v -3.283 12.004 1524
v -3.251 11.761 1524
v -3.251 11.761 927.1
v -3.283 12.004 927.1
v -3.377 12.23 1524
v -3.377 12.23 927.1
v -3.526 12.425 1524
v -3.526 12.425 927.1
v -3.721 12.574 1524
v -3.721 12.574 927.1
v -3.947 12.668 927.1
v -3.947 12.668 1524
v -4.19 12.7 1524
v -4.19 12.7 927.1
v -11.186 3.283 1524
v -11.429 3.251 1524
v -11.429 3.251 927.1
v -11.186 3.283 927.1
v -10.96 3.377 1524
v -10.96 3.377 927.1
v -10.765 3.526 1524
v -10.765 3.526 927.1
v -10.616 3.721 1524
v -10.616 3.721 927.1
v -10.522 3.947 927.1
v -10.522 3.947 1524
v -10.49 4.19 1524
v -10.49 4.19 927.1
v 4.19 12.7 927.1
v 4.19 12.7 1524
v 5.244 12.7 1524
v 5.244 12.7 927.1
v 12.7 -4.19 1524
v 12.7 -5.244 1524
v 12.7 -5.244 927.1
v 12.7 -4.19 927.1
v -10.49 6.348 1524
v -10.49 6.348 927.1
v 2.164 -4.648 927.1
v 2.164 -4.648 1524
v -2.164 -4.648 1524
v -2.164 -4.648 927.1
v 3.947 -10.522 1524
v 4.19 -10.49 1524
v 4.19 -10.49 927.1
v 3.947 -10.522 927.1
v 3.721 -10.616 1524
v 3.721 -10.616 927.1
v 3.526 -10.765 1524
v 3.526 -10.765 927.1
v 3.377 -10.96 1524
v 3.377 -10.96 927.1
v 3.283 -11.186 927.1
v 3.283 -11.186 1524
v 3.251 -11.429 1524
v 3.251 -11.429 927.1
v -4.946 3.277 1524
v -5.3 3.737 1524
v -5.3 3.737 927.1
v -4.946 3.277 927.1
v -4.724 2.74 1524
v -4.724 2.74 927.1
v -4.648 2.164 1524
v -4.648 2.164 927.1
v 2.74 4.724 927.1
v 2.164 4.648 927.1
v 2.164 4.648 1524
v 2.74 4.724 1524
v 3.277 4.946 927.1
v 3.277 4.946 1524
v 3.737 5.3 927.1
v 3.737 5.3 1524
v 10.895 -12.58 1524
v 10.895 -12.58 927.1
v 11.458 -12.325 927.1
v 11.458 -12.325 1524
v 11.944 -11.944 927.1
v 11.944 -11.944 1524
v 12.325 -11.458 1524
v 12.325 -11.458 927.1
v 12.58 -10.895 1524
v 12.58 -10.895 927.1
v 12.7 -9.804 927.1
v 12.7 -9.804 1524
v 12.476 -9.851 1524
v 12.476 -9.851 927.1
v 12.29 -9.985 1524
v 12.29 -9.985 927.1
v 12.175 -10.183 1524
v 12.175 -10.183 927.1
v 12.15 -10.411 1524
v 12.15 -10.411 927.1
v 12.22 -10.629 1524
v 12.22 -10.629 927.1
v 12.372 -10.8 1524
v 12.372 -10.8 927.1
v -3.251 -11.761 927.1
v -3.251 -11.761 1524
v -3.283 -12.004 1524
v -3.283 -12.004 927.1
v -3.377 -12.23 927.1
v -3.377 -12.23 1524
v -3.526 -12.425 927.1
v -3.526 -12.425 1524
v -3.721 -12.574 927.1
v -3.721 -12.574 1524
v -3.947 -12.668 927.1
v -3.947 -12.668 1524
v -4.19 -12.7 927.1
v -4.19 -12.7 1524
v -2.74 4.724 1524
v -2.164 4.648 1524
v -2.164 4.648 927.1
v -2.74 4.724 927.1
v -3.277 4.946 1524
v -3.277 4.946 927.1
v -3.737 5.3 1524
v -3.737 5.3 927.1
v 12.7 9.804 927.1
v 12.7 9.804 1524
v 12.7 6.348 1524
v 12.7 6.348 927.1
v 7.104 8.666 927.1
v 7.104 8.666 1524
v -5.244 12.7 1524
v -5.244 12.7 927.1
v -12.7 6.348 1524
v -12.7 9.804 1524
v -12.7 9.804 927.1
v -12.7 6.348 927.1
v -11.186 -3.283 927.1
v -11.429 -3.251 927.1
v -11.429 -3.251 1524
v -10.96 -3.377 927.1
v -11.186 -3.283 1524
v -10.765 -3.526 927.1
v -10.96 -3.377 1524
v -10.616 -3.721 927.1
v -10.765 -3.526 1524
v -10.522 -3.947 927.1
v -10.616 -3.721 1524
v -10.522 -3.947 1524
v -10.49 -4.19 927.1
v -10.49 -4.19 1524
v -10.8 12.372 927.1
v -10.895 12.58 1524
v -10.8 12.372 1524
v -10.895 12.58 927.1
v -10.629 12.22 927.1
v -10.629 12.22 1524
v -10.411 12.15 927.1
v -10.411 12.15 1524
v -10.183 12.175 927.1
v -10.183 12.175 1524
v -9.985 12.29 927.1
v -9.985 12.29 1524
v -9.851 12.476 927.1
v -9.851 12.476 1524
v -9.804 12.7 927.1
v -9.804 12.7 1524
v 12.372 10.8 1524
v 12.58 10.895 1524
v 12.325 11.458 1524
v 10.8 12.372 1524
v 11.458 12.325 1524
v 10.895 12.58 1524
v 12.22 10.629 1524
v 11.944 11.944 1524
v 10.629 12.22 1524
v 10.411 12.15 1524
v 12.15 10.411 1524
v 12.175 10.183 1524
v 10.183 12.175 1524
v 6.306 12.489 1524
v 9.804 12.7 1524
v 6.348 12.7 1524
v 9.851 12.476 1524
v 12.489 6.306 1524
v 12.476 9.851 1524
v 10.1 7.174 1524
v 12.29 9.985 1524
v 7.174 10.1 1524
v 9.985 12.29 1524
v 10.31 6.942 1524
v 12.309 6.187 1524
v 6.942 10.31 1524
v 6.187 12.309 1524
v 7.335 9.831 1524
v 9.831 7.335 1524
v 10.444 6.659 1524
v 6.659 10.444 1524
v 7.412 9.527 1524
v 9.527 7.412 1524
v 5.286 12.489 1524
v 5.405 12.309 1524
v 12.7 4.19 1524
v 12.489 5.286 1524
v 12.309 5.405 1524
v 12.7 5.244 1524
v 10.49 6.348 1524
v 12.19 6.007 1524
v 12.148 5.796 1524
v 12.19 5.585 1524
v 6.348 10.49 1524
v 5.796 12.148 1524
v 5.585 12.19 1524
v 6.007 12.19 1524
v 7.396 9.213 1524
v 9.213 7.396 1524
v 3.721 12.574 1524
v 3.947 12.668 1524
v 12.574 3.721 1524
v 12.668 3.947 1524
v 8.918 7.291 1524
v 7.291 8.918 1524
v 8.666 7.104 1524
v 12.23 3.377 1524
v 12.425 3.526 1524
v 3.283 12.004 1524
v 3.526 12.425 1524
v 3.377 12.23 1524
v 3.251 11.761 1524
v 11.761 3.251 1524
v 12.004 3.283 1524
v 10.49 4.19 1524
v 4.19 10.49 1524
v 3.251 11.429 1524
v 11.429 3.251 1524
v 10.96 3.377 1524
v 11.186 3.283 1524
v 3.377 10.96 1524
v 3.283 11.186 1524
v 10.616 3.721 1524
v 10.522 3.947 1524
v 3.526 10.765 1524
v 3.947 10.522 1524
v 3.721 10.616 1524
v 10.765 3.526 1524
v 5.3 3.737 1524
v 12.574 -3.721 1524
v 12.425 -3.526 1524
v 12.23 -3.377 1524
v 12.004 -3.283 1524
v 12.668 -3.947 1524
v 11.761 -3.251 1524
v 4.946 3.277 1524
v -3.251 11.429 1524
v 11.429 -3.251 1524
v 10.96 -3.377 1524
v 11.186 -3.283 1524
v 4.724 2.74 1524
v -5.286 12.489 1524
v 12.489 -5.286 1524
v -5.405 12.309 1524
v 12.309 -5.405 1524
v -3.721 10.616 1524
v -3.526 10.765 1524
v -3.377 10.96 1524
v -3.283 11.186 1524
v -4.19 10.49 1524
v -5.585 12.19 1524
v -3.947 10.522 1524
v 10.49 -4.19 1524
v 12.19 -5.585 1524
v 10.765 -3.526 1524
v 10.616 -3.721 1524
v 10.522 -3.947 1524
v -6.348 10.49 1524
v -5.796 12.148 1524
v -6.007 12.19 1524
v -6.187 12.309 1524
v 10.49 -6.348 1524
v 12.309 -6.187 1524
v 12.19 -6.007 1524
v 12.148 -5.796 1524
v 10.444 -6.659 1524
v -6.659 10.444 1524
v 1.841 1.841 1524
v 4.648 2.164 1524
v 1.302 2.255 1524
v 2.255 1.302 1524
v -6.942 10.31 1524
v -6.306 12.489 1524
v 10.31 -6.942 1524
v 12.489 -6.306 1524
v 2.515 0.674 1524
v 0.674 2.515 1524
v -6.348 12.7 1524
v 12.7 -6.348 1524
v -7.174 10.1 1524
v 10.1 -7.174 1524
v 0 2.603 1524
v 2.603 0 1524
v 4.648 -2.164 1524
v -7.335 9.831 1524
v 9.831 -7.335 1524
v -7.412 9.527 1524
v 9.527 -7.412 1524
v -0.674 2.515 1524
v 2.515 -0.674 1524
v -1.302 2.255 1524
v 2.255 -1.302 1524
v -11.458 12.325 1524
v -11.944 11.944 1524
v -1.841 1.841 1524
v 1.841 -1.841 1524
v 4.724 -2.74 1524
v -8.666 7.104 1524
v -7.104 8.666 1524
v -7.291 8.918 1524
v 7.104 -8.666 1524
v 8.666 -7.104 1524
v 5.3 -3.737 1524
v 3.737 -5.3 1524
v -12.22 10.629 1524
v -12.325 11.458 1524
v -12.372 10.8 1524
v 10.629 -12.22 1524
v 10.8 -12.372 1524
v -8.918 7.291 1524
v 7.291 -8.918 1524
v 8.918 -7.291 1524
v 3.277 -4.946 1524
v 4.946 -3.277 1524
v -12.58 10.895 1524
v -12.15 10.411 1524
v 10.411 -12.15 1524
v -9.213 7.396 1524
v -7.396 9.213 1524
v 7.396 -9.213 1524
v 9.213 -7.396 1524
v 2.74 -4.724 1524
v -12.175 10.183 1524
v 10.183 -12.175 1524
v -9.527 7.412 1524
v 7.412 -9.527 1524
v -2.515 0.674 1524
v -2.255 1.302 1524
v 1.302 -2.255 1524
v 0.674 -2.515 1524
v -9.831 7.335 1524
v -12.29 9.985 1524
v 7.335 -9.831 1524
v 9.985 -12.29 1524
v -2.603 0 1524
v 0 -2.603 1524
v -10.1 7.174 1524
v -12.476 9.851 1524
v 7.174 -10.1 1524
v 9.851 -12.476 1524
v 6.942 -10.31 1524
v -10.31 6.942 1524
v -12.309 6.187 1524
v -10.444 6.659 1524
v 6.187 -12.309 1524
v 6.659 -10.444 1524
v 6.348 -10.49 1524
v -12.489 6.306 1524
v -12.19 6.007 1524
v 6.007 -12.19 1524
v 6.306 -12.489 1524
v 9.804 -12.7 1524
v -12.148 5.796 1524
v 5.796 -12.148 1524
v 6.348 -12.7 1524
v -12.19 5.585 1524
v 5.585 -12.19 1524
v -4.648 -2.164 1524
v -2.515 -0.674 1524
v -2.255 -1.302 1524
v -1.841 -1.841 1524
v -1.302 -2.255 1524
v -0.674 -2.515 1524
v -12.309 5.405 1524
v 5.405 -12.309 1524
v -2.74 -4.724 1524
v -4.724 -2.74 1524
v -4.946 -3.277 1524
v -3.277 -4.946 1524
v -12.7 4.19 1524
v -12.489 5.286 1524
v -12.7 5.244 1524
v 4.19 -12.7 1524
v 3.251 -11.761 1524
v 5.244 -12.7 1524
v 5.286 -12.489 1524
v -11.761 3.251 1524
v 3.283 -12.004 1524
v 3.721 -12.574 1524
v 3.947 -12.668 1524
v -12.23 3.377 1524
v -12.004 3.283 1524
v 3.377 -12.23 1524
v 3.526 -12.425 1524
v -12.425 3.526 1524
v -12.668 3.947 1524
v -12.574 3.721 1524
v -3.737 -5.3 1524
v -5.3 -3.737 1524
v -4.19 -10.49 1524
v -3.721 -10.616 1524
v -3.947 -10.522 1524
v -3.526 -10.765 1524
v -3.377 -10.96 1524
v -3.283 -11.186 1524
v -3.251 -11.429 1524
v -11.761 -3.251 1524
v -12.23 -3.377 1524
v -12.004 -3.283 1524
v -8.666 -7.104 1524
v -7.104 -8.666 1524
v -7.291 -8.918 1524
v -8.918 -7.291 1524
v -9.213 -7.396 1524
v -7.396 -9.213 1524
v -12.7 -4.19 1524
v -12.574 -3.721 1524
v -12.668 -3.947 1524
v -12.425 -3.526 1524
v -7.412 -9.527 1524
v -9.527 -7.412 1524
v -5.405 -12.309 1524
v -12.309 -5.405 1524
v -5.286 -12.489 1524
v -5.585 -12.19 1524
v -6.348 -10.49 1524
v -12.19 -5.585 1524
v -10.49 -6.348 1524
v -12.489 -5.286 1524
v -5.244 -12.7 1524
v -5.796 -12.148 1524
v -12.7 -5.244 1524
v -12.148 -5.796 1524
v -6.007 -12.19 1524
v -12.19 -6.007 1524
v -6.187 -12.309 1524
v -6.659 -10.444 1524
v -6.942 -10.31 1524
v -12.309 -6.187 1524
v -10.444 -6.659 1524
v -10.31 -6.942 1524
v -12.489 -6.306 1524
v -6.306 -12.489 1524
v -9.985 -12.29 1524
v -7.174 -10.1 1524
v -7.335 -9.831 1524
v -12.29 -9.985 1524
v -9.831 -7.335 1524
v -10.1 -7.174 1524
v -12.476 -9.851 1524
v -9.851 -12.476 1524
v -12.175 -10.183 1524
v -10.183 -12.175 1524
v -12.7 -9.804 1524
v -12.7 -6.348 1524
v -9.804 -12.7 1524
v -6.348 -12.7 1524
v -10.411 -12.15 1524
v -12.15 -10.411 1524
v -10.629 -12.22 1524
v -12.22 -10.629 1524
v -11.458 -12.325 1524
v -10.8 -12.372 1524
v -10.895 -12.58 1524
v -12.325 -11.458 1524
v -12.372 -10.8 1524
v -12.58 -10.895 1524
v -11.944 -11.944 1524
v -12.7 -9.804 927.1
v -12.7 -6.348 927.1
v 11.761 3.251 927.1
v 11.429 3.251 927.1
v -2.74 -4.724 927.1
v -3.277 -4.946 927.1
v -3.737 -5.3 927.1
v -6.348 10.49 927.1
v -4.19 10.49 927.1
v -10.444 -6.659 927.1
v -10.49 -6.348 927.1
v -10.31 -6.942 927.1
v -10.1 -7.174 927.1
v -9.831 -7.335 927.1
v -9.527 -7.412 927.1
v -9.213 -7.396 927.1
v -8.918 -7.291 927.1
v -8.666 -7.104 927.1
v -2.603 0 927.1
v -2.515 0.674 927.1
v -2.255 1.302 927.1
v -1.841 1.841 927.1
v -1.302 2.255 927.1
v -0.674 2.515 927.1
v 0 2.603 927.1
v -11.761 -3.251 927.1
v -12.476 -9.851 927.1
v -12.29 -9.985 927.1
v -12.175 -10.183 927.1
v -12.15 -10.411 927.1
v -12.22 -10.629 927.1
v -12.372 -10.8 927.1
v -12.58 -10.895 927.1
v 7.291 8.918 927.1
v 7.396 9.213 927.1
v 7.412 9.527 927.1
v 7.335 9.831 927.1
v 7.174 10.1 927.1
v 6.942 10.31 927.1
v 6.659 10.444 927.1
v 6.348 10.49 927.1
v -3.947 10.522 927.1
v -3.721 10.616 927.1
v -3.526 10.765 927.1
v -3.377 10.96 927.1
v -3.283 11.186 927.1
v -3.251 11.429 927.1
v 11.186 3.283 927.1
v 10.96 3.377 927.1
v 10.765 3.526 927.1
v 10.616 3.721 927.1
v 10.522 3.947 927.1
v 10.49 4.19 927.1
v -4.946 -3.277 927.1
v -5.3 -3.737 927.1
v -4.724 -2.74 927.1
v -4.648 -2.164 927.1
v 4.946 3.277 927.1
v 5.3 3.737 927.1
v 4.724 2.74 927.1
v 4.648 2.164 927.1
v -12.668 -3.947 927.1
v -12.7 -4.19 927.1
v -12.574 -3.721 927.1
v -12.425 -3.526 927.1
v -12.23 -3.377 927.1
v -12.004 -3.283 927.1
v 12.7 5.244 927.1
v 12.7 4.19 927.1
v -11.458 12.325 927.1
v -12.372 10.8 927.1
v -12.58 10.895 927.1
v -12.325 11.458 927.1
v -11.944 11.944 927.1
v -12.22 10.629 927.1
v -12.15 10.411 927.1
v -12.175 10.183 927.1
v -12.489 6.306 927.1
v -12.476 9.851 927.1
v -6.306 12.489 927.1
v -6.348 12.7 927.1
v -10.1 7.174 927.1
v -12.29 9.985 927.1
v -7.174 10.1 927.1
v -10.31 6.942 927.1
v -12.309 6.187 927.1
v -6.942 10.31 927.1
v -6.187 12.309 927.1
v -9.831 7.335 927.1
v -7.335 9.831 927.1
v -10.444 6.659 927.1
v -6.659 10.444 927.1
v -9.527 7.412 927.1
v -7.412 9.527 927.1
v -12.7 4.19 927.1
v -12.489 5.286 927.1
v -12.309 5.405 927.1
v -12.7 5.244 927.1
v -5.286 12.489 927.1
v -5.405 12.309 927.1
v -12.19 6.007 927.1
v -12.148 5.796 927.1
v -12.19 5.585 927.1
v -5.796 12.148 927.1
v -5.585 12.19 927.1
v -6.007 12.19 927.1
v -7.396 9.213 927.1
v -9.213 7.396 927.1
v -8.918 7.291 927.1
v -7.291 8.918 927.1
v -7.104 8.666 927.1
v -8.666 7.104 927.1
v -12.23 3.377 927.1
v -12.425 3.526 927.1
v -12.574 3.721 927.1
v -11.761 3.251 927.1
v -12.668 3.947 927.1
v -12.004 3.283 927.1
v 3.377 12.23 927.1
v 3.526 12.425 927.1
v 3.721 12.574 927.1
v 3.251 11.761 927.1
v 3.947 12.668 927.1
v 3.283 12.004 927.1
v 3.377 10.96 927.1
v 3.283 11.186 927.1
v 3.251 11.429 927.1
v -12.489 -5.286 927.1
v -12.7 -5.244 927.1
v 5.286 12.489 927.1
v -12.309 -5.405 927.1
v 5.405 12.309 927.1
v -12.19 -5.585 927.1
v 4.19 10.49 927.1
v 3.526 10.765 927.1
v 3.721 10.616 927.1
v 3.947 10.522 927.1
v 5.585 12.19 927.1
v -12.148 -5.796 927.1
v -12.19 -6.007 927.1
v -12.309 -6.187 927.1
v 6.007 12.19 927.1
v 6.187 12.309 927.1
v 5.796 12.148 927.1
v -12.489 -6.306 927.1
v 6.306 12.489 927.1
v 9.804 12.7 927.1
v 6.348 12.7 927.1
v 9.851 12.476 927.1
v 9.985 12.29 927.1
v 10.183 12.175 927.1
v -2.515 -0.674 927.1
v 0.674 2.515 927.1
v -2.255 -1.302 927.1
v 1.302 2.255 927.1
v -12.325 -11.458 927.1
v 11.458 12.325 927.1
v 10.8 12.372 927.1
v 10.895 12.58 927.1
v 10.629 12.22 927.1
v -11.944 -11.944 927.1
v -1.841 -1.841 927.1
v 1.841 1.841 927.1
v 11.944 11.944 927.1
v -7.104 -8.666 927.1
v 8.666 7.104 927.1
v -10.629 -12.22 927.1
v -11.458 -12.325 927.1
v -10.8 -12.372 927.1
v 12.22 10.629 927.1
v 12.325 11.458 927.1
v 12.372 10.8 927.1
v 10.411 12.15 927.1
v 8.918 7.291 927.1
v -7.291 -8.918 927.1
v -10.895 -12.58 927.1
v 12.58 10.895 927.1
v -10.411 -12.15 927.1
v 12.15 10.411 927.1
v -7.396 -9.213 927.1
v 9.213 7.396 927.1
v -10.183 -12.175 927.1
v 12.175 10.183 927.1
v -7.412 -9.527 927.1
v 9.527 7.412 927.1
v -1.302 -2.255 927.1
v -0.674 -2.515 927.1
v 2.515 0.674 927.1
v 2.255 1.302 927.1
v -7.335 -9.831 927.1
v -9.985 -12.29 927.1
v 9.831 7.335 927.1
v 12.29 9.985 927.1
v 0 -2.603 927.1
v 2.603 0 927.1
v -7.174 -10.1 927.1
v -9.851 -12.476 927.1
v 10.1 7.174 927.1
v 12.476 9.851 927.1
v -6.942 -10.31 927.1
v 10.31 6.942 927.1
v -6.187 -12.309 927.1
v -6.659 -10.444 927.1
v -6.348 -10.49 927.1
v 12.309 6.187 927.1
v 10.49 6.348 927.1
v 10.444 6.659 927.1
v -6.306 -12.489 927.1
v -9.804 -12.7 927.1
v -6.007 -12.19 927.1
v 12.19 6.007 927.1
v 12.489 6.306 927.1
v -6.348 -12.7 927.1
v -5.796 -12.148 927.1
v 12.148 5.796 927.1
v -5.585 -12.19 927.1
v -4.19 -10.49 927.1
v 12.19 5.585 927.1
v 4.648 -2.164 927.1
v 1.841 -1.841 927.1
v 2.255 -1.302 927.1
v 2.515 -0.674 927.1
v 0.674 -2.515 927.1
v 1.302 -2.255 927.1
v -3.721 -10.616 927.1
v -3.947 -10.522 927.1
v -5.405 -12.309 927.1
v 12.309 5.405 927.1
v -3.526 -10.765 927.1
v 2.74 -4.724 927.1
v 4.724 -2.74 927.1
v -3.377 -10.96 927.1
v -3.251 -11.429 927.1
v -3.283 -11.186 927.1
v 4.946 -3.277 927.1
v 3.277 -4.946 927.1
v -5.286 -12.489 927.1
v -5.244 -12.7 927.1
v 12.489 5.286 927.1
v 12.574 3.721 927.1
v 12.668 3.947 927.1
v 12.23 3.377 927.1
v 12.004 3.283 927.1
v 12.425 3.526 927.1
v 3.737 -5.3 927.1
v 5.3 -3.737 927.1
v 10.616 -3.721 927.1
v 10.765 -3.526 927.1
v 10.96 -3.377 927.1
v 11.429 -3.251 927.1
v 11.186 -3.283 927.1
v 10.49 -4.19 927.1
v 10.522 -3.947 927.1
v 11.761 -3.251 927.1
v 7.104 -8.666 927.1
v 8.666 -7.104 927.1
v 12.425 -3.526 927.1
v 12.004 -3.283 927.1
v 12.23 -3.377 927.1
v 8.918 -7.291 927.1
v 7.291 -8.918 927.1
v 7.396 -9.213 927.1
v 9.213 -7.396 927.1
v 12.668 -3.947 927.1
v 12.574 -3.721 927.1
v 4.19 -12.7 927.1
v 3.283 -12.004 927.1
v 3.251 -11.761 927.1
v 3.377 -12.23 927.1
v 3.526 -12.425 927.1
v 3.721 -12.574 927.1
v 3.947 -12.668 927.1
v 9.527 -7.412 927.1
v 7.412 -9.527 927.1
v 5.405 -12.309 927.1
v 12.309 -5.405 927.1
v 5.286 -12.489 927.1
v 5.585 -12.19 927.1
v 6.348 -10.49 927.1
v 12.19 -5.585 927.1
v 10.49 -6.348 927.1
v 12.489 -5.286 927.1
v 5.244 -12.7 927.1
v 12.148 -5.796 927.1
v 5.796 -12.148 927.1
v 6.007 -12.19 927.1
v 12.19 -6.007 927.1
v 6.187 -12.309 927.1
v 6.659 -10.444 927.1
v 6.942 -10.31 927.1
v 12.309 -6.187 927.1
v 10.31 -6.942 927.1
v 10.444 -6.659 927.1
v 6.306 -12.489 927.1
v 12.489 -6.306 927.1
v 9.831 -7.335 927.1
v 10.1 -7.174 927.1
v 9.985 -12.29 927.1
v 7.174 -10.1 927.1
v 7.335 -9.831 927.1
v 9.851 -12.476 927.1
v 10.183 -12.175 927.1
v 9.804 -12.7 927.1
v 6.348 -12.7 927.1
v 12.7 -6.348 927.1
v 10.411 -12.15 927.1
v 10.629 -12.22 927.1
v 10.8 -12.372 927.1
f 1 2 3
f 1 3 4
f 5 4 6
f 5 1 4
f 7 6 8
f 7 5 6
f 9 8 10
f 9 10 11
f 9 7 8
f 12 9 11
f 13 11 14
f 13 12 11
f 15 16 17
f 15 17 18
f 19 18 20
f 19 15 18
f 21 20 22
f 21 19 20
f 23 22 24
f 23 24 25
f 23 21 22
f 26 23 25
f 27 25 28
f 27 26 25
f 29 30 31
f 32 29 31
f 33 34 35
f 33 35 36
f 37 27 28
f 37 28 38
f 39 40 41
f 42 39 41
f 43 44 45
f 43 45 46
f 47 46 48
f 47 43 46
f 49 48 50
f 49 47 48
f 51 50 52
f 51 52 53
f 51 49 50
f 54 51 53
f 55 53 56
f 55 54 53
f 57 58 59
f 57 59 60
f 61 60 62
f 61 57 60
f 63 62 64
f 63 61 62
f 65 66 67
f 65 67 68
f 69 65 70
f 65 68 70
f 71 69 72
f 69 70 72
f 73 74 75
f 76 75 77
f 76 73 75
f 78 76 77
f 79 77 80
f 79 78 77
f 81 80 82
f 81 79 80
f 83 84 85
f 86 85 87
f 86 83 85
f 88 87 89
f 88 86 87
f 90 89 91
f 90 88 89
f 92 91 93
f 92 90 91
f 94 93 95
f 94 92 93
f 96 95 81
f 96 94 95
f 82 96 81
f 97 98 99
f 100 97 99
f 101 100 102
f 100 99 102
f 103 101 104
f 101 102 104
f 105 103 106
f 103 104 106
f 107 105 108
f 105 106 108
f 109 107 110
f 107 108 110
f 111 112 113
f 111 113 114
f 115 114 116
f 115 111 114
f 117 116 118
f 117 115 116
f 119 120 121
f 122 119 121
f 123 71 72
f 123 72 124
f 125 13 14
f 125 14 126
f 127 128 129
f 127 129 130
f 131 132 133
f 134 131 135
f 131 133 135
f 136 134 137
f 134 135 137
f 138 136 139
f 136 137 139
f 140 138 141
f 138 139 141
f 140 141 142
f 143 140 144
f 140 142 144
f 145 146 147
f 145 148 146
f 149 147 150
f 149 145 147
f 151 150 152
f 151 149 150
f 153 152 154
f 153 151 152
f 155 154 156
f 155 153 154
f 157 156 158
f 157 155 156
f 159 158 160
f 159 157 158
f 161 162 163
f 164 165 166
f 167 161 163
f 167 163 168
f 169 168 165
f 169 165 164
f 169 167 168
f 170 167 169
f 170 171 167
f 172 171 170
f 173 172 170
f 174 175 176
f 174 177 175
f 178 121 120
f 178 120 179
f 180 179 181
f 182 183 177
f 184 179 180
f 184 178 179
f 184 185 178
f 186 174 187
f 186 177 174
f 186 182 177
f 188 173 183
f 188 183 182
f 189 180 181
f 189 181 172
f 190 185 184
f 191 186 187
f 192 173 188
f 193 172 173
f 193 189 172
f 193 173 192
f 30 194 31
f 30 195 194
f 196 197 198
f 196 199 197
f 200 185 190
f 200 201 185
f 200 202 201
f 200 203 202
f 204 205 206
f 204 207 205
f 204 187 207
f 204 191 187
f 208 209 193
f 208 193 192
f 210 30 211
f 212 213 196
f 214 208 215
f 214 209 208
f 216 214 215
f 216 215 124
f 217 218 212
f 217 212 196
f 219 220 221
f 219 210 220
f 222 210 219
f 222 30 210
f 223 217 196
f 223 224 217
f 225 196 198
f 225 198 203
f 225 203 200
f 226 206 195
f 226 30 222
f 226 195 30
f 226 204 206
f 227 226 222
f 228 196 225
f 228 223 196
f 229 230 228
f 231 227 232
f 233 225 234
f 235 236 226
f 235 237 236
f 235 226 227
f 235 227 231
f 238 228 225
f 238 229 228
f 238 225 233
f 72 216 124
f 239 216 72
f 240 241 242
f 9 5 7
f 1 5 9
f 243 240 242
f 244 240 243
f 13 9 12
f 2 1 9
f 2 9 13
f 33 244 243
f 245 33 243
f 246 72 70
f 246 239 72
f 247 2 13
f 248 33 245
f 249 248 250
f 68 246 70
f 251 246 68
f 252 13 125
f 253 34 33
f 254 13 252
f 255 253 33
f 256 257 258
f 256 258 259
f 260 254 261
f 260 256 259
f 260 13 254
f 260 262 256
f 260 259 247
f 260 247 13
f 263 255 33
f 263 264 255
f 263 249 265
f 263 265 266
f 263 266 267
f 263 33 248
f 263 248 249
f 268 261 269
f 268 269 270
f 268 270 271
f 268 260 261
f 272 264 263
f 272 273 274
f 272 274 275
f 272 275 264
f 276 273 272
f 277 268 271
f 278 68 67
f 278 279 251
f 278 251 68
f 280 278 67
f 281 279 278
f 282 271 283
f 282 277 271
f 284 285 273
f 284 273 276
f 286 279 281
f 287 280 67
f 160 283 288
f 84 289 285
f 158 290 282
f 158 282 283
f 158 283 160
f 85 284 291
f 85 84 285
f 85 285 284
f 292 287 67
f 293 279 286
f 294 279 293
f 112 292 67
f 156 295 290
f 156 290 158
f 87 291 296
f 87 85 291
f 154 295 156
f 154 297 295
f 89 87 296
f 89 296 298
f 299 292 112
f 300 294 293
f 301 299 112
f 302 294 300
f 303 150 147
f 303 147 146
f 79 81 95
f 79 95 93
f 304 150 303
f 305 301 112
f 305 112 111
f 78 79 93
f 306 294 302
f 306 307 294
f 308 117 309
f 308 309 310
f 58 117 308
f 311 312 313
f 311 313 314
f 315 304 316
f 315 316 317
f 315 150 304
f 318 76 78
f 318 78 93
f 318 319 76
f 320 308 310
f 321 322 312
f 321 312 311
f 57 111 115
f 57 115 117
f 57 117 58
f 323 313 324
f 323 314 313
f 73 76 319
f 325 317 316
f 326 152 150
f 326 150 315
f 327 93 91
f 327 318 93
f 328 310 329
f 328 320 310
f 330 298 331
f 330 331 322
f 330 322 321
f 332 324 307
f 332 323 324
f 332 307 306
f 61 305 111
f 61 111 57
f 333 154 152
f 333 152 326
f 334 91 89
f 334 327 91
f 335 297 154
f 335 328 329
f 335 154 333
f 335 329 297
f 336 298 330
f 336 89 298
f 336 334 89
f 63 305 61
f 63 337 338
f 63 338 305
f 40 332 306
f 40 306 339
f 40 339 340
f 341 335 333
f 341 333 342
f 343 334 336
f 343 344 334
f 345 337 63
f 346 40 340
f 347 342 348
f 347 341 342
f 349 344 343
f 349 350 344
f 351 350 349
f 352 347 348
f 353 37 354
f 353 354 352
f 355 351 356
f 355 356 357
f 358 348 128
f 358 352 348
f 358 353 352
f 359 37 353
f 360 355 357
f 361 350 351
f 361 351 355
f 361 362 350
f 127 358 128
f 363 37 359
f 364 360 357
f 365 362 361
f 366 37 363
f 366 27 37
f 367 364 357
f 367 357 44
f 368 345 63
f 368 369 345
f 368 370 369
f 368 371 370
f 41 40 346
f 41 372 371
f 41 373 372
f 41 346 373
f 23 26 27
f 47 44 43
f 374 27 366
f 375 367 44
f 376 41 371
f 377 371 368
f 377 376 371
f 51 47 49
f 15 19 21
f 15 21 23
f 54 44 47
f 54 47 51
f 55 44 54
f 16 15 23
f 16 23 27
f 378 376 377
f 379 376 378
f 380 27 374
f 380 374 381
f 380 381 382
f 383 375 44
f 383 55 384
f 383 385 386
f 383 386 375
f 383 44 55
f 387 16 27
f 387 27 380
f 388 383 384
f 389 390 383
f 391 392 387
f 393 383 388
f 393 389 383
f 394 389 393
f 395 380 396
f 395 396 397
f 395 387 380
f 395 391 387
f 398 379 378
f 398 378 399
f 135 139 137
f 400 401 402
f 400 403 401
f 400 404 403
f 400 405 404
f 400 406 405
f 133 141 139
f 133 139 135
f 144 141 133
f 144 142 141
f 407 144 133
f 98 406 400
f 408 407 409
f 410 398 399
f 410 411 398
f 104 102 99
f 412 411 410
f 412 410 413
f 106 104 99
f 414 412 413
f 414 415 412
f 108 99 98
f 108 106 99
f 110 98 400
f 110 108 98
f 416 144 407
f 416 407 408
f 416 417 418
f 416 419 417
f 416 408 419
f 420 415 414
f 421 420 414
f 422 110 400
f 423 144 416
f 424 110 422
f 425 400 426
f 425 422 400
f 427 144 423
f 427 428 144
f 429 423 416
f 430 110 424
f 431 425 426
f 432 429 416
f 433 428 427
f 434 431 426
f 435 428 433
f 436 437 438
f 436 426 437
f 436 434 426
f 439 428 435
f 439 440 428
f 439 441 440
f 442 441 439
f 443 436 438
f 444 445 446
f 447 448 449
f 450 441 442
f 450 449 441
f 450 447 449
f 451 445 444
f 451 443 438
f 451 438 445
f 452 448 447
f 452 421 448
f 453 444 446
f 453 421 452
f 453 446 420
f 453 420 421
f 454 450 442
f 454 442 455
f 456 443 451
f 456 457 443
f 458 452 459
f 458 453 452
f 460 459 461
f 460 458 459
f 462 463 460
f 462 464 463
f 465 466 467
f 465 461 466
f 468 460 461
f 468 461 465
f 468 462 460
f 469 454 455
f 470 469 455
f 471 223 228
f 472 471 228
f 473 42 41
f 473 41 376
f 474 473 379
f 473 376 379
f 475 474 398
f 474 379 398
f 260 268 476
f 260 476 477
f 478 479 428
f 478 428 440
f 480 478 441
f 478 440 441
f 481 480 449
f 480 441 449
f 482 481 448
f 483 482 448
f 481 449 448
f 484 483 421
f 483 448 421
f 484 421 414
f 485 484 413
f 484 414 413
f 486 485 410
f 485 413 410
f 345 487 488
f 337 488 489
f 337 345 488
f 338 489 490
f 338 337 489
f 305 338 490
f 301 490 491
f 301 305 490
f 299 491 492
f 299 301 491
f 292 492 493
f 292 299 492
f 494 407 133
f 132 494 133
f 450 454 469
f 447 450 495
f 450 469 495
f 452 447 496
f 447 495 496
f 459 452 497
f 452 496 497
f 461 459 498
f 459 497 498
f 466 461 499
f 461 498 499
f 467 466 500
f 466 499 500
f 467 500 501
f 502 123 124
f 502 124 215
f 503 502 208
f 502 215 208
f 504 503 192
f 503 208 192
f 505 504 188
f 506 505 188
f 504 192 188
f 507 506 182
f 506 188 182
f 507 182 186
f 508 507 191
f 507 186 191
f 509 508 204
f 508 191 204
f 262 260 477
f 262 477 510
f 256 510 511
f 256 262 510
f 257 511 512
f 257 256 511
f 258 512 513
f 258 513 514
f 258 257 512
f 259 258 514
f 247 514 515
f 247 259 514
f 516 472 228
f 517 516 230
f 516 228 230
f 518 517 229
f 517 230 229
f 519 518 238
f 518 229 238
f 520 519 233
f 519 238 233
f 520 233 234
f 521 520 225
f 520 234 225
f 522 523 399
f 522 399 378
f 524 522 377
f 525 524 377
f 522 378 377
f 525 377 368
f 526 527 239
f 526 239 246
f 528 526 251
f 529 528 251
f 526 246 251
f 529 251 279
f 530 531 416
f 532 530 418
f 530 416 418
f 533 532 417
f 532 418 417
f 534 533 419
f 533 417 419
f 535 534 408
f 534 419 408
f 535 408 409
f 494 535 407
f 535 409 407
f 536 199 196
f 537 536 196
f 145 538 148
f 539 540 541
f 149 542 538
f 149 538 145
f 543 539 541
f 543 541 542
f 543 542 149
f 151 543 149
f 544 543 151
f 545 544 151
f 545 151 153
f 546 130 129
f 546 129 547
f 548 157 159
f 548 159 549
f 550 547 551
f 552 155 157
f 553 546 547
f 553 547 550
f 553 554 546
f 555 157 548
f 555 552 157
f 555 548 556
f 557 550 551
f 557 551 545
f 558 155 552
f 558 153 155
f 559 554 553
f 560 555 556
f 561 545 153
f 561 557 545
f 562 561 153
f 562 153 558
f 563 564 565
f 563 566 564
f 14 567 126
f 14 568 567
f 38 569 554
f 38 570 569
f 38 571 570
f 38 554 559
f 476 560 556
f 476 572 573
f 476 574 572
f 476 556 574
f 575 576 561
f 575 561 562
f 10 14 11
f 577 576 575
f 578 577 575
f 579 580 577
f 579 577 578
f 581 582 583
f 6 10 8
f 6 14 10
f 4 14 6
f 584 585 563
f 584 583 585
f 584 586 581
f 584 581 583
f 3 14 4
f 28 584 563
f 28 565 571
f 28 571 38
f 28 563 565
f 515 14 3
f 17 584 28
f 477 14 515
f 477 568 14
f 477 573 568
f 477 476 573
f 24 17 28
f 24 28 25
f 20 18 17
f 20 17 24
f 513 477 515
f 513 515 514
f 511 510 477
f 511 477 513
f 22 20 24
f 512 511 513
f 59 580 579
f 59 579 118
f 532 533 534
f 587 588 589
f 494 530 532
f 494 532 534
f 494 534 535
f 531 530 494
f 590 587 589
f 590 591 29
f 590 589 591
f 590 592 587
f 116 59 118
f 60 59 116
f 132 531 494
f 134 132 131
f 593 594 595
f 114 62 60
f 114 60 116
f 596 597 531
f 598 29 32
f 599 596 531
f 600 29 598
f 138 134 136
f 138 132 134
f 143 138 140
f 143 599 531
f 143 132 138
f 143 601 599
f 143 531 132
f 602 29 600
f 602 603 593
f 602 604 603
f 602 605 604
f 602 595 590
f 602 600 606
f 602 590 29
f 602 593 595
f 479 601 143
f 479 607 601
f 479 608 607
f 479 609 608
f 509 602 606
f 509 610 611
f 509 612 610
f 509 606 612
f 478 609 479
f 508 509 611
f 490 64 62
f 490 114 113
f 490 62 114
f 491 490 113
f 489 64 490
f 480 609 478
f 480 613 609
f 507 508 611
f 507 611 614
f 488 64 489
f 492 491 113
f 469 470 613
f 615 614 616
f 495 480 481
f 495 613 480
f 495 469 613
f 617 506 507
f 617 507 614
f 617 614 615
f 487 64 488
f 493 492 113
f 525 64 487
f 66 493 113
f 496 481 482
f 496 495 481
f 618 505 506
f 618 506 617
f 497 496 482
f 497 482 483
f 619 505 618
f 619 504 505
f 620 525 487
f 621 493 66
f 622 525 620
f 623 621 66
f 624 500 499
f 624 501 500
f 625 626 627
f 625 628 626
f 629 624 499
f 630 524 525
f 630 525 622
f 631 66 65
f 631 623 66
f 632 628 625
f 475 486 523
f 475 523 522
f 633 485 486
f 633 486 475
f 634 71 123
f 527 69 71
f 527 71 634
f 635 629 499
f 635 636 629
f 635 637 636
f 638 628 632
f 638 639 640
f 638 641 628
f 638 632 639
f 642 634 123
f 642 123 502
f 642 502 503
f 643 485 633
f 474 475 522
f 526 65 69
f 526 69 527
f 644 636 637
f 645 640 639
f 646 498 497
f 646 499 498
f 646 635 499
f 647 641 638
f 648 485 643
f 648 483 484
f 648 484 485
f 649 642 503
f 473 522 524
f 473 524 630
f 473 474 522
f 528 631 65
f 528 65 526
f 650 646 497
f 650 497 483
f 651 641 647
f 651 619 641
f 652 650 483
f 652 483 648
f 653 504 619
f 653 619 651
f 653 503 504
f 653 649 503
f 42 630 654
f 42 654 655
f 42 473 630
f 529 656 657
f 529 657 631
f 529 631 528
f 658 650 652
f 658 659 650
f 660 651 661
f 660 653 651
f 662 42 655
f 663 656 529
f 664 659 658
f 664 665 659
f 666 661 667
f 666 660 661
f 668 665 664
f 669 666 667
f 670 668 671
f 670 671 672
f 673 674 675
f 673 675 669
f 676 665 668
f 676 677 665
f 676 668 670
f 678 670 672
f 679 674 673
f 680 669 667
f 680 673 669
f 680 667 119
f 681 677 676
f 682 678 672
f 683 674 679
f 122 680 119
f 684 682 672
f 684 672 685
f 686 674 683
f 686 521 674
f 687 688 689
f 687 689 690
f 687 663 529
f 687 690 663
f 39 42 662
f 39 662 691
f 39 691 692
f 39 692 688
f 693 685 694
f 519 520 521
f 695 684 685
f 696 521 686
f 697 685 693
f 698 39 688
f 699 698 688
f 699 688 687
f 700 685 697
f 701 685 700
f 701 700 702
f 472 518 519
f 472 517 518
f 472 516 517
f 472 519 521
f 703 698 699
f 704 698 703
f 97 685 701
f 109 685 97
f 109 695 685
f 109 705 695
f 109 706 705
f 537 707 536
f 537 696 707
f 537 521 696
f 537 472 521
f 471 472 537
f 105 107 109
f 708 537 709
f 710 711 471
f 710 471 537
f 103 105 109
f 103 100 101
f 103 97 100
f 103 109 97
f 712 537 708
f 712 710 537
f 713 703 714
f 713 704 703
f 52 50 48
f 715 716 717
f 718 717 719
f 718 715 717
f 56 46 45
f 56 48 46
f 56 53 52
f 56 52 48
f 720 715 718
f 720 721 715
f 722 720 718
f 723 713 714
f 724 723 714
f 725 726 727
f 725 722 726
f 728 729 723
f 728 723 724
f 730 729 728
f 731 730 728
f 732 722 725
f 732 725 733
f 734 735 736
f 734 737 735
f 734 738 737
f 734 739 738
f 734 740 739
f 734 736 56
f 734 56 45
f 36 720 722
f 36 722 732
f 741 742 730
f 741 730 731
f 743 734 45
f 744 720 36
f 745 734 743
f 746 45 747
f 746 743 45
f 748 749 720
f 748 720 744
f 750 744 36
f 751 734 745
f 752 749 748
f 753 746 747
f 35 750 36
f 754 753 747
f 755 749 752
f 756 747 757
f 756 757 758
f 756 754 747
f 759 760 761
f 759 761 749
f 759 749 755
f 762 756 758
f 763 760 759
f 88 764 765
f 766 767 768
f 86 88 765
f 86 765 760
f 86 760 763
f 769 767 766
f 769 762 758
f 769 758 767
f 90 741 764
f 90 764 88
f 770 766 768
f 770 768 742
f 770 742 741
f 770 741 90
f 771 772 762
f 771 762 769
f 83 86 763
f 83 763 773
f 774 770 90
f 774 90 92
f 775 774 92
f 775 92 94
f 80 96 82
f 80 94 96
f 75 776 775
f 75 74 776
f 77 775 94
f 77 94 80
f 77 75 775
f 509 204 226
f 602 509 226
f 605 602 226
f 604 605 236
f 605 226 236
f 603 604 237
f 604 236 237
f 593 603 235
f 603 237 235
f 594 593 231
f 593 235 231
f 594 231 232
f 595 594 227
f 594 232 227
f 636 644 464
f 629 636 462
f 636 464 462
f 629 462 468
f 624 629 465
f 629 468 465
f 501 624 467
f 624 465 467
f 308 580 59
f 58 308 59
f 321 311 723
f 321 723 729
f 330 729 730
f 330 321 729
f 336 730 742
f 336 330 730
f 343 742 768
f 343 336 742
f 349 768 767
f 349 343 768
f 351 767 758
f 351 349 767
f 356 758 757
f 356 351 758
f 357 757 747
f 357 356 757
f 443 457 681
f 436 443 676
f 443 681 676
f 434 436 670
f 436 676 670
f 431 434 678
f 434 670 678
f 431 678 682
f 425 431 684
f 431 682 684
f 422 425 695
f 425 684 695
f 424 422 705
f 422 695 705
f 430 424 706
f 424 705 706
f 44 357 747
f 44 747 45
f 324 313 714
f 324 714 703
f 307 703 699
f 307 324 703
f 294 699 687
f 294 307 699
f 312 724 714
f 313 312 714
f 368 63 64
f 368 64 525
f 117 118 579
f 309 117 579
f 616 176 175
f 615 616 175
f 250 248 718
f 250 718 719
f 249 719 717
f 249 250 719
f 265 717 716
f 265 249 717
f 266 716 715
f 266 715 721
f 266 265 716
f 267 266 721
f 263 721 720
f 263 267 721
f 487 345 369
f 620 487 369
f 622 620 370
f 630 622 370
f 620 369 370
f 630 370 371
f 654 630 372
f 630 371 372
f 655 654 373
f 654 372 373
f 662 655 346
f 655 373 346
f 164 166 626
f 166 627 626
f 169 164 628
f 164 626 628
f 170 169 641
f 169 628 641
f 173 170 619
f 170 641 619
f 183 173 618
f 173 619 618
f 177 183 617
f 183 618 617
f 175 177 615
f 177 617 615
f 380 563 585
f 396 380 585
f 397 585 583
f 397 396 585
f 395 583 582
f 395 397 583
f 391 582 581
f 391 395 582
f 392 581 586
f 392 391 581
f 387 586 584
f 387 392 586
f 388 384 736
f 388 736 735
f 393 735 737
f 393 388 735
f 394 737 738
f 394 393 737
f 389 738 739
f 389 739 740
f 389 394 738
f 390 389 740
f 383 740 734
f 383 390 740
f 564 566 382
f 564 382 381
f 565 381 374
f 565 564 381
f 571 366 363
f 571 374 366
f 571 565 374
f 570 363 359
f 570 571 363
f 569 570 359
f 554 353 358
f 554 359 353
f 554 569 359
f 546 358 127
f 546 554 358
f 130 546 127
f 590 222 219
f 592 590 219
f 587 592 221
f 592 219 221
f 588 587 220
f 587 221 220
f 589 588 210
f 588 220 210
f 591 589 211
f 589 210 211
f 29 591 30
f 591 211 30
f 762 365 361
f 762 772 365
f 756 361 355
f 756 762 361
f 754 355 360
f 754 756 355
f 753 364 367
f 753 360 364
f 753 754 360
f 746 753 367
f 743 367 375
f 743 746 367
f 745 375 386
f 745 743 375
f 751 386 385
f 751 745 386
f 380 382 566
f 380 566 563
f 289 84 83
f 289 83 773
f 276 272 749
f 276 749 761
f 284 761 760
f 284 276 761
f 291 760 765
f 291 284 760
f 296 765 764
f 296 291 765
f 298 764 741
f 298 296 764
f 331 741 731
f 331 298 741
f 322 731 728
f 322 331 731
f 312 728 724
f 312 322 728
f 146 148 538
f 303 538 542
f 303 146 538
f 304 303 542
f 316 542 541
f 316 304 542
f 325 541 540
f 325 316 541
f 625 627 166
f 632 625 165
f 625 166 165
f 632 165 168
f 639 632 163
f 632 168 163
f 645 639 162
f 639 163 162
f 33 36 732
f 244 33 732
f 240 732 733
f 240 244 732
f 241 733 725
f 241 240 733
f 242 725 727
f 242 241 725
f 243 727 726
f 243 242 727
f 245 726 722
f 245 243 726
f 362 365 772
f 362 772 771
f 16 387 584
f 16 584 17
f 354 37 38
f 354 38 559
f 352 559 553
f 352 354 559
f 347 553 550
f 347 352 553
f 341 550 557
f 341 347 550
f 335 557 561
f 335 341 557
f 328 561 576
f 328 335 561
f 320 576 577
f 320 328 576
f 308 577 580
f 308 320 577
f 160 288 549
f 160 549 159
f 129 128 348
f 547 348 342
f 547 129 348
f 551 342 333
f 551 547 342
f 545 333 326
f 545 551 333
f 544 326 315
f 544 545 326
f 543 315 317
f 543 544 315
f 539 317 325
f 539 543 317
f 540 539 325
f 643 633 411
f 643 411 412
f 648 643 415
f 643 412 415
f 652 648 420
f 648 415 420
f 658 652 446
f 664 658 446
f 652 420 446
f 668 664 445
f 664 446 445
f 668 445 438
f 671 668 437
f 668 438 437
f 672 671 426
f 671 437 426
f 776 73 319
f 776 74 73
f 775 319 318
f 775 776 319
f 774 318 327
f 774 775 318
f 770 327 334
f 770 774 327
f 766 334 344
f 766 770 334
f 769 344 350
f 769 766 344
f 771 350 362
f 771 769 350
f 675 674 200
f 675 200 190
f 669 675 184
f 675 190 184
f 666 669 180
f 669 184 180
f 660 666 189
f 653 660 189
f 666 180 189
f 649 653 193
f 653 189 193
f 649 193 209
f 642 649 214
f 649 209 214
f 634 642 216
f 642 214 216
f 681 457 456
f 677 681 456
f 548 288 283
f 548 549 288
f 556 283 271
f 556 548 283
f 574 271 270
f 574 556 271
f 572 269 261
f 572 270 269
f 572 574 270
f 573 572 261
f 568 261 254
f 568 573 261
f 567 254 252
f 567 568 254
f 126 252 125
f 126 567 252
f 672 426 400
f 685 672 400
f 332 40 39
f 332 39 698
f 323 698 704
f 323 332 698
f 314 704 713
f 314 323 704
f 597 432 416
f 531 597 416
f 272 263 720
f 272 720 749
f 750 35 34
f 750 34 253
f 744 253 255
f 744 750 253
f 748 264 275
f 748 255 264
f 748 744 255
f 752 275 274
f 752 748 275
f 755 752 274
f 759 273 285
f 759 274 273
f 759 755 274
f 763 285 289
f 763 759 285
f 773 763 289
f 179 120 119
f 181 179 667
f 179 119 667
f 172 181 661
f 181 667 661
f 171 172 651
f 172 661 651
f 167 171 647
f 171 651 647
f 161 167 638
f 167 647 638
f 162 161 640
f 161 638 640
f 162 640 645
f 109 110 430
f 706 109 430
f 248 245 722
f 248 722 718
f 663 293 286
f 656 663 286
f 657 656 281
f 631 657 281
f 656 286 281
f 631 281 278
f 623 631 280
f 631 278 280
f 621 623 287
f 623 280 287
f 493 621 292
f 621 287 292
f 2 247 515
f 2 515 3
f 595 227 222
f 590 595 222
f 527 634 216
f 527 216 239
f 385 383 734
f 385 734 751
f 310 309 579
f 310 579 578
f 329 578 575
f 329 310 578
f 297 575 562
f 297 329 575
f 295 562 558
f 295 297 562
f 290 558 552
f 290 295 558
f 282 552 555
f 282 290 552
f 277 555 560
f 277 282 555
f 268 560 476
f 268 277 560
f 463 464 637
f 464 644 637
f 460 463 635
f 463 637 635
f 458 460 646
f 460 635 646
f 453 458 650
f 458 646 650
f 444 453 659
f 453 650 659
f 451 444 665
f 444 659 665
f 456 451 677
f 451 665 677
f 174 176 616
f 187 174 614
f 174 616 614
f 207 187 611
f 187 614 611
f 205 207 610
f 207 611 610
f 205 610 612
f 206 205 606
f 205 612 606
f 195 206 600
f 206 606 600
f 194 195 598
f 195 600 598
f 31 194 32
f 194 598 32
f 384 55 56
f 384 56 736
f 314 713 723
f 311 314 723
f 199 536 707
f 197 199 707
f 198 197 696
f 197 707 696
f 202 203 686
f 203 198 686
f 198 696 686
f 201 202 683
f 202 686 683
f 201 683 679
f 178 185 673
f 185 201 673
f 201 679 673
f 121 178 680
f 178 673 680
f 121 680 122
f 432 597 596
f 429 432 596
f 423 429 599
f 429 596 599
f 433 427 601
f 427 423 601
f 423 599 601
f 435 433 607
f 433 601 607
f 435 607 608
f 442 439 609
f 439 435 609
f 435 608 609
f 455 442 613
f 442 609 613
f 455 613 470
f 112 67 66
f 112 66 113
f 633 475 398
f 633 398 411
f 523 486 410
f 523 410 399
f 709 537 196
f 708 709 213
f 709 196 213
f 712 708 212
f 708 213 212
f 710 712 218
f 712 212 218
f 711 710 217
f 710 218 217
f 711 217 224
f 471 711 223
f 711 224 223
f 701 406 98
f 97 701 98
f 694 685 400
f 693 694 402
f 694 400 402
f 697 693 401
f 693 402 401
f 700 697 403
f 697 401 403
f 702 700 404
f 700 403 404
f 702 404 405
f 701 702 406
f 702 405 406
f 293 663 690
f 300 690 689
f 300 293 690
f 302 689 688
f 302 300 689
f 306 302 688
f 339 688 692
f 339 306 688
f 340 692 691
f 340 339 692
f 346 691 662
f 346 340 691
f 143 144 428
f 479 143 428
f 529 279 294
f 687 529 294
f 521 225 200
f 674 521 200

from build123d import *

# Parameters (mm, degrees)
BOSS_EXTRUDE1_DEPTH     = 1524
CUT_EXTRUDE1_DEPTH      = 1525.105829659
CUT_EXTRUDE1_DEPTH_BACK = 1525.105829659
SKETCH5_R               = 0.55245
CUT_EXTRUDE2_DEPTH      = 1525.105829659
CUT_EXTRUDE2_DEPTH_BACK = 1525.105829659
SKETCH8_W               = 50.559993734
SKETCH8_H               = 1231.9
CUT_EXTRUDE3_DEPTH      = 1525.105829659
CUT_EXTRUDE3_DEPTH_BACK = 1525.105829659
SKETCH9_W               = 50.679996867
SKETCH9_H               = 1244.6


with BuildPart() as part:
    # Sketch4 → Boss-Extrude1 (new, symmetric)
    with BuildSketch(Plane.XY):
        with BuildLine():
            Line((4.190365, -12.7), (10.11729625, -12.7))
            ThreePointArc((10.11729625, -12.7), (11.943543585, -11.943543585), (12.7, -10.11729625))
            Line((12.7, -10.11729625), (12.7, -4.190365))
            ThreePointArc((12.7, -4.190365), (12.42492494, -3.52627506), (11.760835, -3.2512))
            Line((11.760835, -3.2512), (11.429365, -3.2512))
            ThreePointArc((11.429365, -3.2512), (10.76527506, -3.52627506), (10.4902, -4.190365))
            Line((10.4902, -4.190365), (10.4902, -6.348478019))
            ThreePointArc((10.4902, -6.348478019), (9.830707141, -7.335478831), (8.666460301, -7.103895736))
            Line((8.666460301, -7.103895736), (5.299899128, -3.737334563))
            ThreePointArc((5.299899128, -3.737334563), (4.817571085, -3.015479634), (4.6482, -2.16399369))
            Line((4.6482, -2.16399369), (4.6482, 0))
            Line((4.6482, 0), (2.6035, 0))
            ThreePointArc((2.6035, 0), (1.840952505, -1.840952505), (0, -2.6035))
            Line((0, -2.6035), (0, -4.6482))
            Line((0, -4.6482), (2.16399369, -4.6482))
            ThreePointArc((2.16399369, -4.6482), (3.015479634, -4.817571085), (3.737334563, -5.299899128))
            Line((3.737334563, -5.299899128), (7.103895736, -8.666460301))
            ThreePointArc((7.103895736, -8.666460301), (7.335478831, -9.830707141), (6.348478019, -10.4902))
            Line((6.348478019, -10.4902), (4.190365, -10.4902))
            ThreePointArc((4.190365, -10.4902), (3.52627506, -10.76527506), (3.2512, -11.429365))
            Line((3.2512, -11.429365), (3.2512, -11.760835))
            ThreePointArc((3.2512, -11.760835), (3.52627506, -12.42492494), (4.190365, -12.7))
        make_face()
    extrude(amount=BOSS_EXTRUDE1_DEPTH, both=True)

    # Sketch5 → Cut-Extrude1 (cut, two sides: drawn at the far end of the back side and taken through both)
    with BuildSketch(Plane.XY.offset(-CUT_EXTRUDE1_DEPTH_BACK)):
        with Locations((10.356153152, -12.7)):
            Circle(SKETCH5_R)
        with Locations((5.796028019, -12.7)):
            Circle(SKETCH5_R)
        with Locations((12.7, -10.356153152)):
            Circle(SKETCH5_R)
        with Locations((12.7, -5.796028019)):
            Circle(SKETCH5_R)
    extrude(amount=CUT_EXTRUDE1_DEPTH + CUT_EXTRUDE1_DEPTH_BACK, mode=Mode.SUBTRACT)

    # Mirror1: part across plane


with BuildPart() as part_1:
    add(part.part)
    add(part.part.mirror(Plane(origin=(0, 0, 0), x_dir=(0, 0, 1), z_dir=(1, 0, 0))))

    # Mirror2: part across plane


with BuildPart() as part_2:
    add(part_1.part)
    add(part_1.part.mirror(Plane.ZX))

    # Sketch8 → Cut-Extrude2 (cut, two sides: drawn at the far end of the back side and taken through both)
    with BuildSketch(Plane(origin=(0, 0, 0), x_dir=(1, 0, 0), z_dir=(0, 1, 0)).offset(-CUT_EXTRUDE2_DEPTH_BACK)):
        with Locations((0, 920.75)):
            Rectangle(SKETCH8_W, SKETCH8_H)
    extrude(amount=CUT_EXTRUDE2_DEPTH + CUT_EXTRUDE2_DEPTH_BACK, mode=Mode.SUBTRACT)

    # Sketch9 → Cut-Extrude3 (cut, two sides: drawn at the far end of the back side and taken through both)
    with BuildSketch(Plane(origin=(0, 0, 0), x_dir=(1, 0, 0), z_dir=(0, 1, 0)).offset(-CUT_EXTRUDE3_DEPTH_BACK)):
        with Locations((-0.060001567, -304.8)):
            Rectangle(SKETCH9_W, SKETCH9_H)
    extrude(amount=CUT_EXTRUDE3_DEPTH + CUT_EXTRUDE3_DEPTH_BACK, mode=Mode.SUBTRACT)


solid = part_2.part
